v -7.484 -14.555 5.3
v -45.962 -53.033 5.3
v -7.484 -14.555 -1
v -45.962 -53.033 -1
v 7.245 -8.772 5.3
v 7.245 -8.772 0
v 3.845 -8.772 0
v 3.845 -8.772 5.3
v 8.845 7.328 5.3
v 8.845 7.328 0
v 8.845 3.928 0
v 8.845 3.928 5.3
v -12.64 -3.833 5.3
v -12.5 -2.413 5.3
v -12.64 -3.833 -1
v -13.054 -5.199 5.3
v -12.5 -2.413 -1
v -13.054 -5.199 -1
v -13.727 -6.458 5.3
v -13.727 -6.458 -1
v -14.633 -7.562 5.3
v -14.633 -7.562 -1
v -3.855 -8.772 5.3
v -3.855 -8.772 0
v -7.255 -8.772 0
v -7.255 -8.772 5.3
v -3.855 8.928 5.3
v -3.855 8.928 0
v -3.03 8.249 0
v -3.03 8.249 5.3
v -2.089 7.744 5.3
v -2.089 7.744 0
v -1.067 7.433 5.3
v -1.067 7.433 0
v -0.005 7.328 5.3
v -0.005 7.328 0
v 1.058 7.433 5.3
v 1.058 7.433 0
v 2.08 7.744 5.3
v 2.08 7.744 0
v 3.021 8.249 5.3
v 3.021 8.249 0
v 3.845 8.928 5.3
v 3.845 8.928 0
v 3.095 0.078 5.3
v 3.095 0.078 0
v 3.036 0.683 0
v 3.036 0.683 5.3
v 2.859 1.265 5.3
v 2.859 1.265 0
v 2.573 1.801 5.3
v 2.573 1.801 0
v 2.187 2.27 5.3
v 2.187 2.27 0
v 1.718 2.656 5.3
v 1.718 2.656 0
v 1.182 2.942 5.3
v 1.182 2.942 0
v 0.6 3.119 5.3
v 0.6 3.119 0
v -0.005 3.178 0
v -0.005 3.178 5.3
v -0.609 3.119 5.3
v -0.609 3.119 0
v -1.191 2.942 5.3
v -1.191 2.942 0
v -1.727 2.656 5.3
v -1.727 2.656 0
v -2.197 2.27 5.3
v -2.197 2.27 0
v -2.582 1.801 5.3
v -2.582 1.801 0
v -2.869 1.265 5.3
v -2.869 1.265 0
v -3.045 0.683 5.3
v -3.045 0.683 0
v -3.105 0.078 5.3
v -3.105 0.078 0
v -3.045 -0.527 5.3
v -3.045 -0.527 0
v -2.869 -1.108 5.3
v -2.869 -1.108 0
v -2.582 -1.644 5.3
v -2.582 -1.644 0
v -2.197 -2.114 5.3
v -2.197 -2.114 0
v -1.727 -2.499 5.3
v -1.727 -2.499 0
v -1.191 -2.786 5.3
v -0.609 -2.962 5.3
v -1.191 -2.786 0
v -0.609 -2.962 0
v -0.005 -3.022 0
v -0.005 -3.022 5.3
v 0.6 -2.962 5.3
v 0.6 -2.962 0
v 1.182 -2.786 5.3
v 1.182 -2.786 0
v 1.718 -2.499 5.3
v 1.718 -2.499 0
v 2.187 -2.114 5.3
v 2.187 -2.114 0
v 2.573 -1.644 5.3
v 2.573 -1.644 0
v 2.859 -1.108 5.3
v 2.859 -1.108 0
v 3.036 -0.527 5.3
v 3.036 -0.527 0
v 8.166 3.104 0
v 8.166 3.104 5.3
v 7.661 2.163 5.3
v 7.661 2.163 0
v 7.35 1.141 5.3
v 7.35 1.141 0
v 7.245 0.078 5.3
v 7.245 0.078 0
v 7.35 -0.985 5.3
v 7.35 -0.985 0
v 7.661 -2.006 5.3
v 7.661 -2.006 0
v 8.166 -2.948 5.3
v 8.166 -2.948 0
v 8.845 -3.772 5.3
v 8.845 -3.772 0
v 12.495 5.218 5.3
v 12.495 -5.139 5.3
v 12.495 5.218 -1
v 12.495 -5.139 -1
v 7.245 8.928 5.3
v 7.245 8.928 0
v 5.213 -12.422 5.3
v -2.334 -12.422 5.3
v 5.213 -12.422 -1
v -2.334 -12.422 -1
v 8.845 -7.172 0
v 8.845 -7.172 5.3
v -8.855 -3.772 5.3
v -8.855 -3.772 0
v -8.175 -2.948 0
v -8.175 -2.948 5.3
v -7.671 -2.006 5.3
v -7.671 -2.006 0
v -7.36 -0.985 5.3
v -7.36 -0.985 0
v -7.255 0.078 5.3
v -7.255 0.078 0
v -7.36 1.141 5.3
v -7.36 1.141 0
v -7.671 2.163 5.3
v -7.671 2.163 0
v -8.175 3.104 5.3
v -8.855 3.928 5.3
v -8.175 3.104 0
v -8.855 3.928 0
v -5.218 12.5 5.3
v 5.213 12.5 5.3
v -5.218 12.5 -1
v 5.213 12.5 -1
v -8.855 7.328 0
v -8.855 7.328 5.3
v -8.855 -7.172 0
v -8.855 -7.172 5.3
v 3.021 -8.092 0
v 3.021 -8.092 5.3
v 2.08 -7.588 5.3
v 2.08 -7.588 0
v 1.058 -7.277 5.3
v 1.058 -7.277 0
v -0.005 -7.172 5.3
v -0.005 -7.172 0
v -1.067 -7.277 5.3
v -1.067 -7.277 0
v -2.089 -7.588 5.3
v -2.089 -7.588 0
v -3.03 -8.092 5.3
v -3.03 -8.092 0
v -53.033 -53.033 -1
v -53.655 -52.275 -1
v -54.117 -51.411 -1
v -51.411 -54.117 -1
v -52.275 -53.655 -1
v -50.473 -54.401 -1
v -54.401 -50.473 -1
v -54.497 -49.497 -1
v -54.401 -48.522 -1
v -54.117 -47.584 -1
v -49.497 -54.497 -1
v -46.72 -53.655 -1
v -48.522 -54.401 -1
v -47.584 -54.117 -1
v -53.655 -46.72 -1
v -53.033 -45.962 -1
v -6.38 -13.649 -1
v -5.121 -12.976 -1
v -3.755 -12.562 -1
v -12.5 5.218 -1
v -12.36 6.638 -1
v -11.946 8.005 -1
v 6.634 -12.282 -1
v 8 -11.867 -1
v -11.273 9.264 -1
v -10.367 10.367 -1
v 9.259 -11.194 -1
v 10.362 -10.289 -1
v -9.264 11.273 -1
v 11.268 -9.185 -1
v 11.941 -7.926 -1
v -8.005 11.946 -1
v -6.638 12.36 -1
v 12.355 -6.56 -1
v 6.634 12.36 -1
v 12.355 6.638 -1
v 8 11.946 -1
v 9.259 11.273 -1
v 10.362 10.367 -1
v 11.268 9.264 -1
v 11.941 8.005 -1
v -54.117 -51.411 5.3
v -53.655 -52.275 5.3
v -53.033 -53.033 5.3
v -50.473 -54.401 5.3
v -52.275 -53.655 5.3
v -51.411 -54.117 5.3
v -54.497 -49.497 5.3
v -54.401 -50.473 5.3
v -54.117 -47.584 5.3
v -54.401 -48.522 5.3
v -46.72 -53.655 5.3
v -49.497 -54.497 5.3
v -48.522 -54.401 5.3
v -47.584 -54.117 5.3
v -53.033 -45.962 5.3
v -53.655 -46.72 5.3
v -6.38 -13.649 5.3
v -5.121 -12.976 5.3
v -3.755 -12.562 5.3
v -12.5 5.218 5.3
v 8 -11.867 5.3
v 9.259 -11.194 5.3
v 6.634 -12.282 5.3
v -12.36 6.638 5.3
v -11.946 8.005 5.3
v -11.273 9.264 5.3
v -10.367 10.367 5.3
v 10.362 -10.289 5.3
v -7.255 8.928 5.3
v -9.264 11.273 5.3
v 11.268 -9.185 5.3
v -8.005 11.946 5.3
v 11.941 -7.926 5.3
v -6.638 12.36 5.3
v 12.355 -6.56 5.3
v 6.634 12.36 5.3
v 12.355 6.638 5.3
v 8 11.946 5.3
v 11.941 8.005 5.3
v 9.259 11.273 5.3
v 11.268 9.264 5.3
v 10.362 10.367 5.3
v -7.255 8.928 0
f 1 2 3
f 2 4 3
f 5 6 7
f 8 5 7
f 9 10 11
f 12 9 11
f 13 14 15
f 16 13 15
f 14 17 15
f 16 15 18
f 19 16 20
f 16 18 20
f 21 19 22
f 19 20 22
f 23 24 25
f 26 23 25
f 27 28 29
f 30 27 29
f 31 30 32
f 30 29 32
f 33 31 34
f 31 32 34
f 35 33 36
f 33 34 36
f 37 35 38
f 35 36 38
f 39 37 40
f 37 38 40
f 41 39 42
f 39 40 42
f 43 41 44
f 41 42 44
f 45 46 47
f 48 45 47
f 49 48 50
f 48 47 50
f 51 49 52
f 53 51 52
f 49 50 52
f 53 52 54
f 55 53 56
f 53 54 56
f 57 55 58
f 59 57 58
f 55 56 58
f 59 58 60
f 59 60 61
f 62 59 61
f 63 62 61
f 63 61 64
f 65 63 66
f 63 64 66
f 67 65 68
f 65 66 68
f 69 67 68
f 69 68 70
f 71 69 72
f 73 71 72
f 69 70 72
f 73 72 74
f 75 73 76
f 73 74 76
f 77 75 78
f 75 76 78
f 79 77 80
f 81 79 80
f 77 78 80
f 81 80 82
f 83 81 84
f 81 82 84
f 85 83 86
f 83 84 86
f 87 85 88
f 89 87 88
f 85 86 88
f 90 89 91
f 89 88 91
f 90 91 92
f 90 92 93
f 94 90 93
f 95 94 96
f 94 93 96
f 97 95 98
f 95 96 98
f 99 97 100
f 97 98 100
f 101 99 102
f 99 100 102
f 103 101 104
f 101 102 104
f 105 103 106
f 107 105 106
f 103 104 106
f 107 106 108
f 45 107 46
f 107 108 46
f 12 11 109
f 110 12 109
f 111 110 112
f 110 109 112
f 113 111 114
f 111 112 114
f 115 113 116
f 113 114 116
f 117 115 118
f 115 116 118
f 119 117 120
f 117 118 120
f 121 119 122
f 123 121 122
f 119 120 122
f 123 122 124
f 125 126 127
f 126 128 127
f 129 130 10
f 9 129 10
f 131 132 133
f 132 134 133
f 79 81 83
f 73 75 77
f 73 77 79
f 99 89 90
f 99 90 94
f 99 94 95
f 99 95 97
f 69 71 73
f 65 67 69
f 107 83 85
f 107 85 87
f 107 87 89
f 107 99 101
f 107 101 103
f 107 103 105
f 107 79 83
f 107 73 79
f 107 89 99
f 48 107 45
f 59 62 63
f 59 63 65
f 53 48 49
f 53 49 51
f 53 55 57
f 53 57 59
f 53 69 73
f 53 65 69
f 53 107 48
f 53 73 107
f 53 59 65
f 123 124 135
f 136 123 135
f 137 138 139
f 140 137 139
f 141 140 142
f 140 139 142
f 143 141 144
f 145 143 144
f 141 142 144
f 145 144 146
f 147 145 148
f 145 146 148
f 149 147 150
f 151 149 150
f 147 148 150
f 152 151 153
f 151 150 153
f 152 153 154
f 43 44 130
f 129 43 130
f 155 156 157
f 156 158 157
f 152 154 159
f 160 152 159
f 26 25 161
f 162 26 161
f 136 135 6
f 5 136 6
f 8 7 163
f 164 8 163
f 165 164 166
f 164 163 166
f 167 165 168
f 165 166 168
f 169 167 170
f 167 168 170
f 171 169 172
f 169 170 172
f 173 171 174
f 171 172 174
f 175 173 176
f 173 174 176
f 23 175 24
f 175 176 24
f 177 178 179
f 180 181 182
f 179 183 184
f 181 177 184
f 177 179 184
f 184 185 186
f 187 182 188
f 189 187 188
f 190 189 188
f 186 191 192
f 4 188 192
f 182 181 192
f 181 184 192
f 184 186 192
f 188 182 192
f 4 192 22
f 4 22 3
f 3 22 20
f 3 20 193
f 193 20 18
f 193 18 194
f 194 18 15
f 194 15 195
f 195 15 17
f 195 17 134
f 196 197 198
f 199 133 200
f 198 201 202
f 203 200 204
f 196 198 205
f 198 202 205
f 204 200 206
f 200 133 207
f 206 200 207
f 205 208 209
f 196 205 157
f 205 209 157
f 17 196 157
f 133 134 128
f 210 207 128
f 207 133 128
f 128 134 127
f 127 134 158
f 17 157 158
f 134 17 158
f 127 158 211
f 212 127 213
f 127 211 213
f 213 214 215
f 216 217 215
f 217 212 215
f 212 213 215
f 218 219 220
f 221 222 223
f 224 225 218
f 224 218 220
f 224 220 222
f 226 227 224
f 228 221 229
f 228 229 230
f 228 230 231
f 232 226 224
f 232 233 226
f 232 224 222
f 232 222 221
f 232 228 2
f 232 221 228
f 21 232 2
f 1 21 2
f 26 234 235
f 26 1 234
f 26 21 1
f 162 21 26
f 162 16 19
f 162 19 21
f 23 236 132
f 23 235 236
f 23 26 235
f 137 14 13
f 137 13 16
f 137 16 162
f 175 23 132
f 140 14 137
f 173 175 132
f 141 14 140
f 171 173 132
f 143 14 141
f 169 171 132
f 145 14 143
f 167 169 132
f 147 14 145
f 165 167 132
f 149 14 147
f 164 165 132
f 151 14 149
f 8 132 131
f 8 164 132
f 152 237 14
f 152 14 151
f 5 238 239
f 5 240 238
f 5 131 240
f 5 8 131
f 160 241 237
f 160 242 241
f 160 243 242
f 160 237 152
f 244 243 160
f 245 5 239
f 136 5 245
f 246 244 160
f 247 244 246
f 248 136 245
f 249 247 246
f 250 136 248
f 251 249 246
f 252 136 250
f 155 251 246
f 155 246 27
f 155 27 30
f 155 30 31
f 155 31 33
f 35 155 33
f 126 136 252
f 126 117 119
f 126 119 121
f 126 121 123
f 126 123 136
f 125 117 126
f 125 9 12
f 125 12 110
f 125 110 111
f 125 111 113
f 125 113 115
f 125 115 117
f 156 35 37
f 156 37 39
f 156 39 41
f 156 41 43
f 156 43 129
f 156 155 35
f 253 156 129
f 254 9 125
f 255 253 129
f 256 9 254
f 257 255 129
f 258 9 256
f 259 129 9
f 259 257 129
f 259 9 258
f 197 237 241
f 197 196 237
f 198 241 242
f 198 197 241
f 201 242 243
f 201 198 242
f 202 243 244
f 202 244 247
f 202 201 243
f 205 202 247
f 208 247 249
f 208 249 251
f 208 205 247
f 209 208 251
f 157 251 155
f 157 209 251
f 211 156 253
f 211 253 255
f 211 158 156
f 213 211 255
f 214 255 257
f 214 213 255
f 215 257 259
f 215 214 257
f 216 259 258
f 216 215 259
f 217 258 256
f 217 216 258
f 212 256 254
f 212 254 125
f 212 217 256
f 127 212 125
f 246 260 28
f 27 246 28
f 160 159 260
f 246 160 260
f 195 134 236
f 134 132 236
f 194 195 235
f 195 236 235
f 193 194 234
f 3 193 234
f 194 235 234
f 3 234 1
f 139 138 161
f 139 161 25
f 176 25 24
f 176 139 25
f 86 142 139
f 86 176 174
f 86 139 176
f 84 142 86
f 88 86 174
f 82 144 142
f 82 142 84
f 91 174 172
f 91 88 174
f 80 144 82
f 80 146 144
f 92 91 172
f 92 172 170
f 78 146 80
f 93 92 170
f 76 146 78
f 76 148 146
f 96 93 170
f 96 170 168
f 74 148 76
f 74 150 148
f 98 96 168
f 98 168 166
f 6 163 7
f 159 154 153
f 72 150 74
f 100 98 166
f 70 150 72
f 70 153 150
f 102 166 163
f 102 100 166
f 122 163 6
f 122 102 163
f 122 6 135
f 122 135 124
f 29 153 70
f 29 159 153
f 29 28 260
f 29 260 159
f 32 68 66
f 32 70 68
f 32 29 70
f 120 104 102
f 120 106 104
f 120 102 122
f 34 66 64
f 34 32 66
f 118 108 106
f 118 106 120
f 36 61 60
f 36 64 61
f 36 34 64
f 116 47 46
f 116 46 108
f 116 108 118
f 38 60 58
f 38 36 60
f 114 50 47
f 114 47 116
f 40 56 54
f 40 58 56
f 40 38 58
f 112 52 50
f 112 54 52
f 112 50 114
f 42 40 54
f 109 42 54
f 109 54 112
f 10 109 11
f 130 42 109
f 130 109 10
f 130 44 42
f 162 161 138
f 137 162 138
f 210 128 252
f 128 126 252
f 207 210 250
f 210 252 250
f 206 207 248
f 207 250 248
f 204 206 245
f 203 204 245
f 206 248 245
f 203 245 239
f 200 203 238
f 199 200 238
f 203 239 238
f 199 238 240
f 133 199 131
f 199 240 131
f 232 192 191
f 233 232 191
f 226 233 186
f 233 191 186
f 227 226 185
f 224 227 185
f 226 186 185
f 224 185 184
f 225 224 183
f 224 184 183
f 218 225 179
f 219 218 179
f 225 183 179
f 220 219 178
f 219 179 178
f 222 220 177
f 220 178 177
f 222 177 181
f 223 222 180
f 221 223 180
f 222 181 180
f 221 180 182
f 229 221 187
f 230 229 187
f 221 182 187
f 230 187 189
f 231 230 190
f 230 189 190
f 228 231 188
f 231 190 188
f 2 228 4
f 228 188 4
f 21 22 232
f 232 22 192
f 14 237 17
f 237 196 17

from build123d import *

# Parameters (mm, degrees)
F0_R     = 3.1
F1_DEPTH = 1
F2_DEPTH = 5.3
F3_R     = 7.282243


with BuildPart() as f1:
    # F0 (on Top) → F1 (new body)
    with BuildSketch(Plane.XY):
        with BuildLine():
            Line((-12.504604, -5.433536), (-53.033009, -45.961941))
            ThreePointArc((-53.033009, -45.961941), (-53.033009, -53.033009), (-45.961941, -53.033009))
            Line((-45.961941, -53.033009), (-5.428932, -12.5))
            Line((-5.428932, -12.5), (-5.35066, -12.421728))
            Line((-5.35066, -12.421728), (12.495396, -12.421728))
            Line((12.495396, -12.421728), (12.495396, 12.5))
            Line((12.495396, 12.5), (-12.5, 12.5))
            Line((-12.5, 12.5), (-12.5, -5.428932))
            Line((-12.5, -5.428932), (-12.504604, -5.433536))
        make_face()
        with BuildLine():
            Line((-8.854604, 7.328272), (-7.254604, 8.928272))
            Line((-7.254604, 8.928272), (-3.854604, 8.928272))
            ThreePointArc((-3.854604, 8.928272), (-0.004604, 7.328272), (3.845396, 8.928272))
            Line((3.845396, 8.928272), (7.245396, 8.928272))
            Line((7.245396, 8.928272), (8.845396, 7.328272))
            Line((8.845396, 7.328272), (8.845396, 3.928272))
            ThreePointArc((8.845396, 3.928272), (7.245396, 0.078272), (8.845396, -3.771728))
            Line((8.845396, -3.771728), (8.845396, -7.171728))
            Line((8.845396, -7.171728), (7.245396, -8.771728))
            Line((7.245396, -8.771728), (3.845396, -8.771728))
            ThreePointArc((3.845396, -8.771728), (-0.004604, -7.171728), (-3.854604, -8.771728))
            Line((-3.854604, -8.771728), (-7.254604, -8.771728))
            Line((-7.254604, -8.771728), (-8.854604, -7.171728))
            Line((-8.854604, -7.171728), (-8.854604, -3.771728))
            ThreePointArc((-8.854604, -3.771728), (-7.254604, 0.078272), (-8.854604, 3.928272))
            Line((-8.854604, 3.928272), (-8.854604, 7.328272))
        make_face(mode=Mode.SUBTRACT)
        with BuildLine():
            Line((-3.854604, 8.928272), (-7.254604, 8.928272))
            Line((-7.254604, 8.928272), (-8.854604, 7.328272))
            Line((-8.854604, 7.328272), (-8.854604, 3.928272))
            ThreePointArc((-8.854604, 3.928272), (-7.254604, 0.078272), (-8.854604, -3.771728))
            Line((-8.854604, -3.771728), (-8.854604, -7.171728))
            Line((-8.854604, -7.171728), (-7.254604, -8.771728))
            Line((-7.254604, -8.771728), (-3.854604, -8.771728))
            ThreePointArc((-3.854604, -8.771728), (-0.004604, -7.171728), (3.845396, -8.771728))
            Line((3.845396, -8.771728), (7.245396, -8.771728))
            Line((7.245396, -8.771728), (8.845396, -7.171728))
            Line((8.845396, -7.171728), (8.845396, -3.771728))
            ThreePointArc((8.845396, -3.771728), (7.245396, 0.078272), (8.845396, 3.928272))
            Line((8.845396, 3.928272), (8.845396, 7.328272))
            Line((8.845396, 7.328272), (7.245396, 8.928272))
            Line((7.245396, 8.928272), (3.845396, 8.928272))
            ThreePointArc((3.845396, 8.928272), (-0.004604, 7.328272), (-3.854604, 8.928272))
        make_face()
        with Locations((-0.004604, 0.078272)):
            Circle(F0_R, mode=Mode.SUBTRACT)
        with Locations((-0.004604, 0.078272)):
            Circle(F0_R)
    extrude(amount=-F1_DEPTH)

    # F0 (on Top) → F2 (join)
    with BuildSketch(Plane.XY):
        with BuildLine():
            Line((-12.504604, -5.433536), (-53.033009, -45.961941))
            ThreePointArc((-53.033009, -45.961941), (-53.033009, -53.033009), (-45.961941, -53.033009))
            Line((-45.961941, -53.033009), (-5.428932, -12.5))
            Line((-5.428932, -12.5), (-5.35066, -12.421728))
            Line((-5.35066, -12.421728), (12.495396, -12.421728))
            Line((12.495396, -12.421728), (12.495396, 12.5))
            Line((12.495396, 12.5), (-12.5, 12.5))
            Line((-12.5, 12.5), (-12.5, -5.428932))
            Line((-12.5, -5.428932), (-12.504604, -5.433536))
        make_face()
        with BuildLine():
            Line((-8.854604, 7.328272), (-7.254604, 8.928272))
            Line((-7.254604, 8.928272), (-3.854604, 8.928272))
            ThreePointArc((-3.854604, 8.928272), (-0.004604, 7.328272), (3.845396, 8.928272))
            Line((3.845396, 8.928272), (7.245396, 8.928272))
            Line((7.245396, 8.928272), (8.845396, 7.328272))
            Line((8.845396, 7.328272), (8.845396, 3.928272))
            ThreePointArc((8.845396, 3.928272), (7.245396, 0.078272), (8.845396, -3.771728))
            Line((8.845396, -3.771728), (8.845396, -7.171728))
            Line((8.845396, -7.171728), (7.245396, -8.771728))
            Line((7.245396, -8.771728), (3.845396, -8.771728))
            ThreePointArc((3.845396, -8.771728), (-0.004604, -7.171728), (-3.854604, -8.771728))
            Line((-3.854604, -8.771728), (-7.254604, -8.771728))
            Line((-7.254604, -8.771728), (-8.854604, -7.171728))
            Line((-8.854604, -7.171728), (-8.854604, -3.771728))
            ThreePointArc((-8.854604, -3.771728), (-7.254604, 0.078272), (-8.854604, 3.928272))
            Line((-8.854604, 3.928272), (-8.854604, 7.328272))
        make_face(mode=Mode.SUBTRACT)
        with Locations((-0.004604, 0.078272)):
            Circle(F0_R)
    extrude(amount=F2_DEPTH)

    # F3
    f3_edges = [f1.edges().sort_by_distance(p)[0] for p in [
        (-12.5, -5.428932, 2.15),
        (-12.5, 12.5, 2.15),
        (12.495396, 12.5, 2.15),
        (12.495396, -12.421728, 2.15),
        (-5.35066, -12.421728, 2.15),
    ]]
    fillet(f3_edges, radius=F3_R)


solid = f1.part
